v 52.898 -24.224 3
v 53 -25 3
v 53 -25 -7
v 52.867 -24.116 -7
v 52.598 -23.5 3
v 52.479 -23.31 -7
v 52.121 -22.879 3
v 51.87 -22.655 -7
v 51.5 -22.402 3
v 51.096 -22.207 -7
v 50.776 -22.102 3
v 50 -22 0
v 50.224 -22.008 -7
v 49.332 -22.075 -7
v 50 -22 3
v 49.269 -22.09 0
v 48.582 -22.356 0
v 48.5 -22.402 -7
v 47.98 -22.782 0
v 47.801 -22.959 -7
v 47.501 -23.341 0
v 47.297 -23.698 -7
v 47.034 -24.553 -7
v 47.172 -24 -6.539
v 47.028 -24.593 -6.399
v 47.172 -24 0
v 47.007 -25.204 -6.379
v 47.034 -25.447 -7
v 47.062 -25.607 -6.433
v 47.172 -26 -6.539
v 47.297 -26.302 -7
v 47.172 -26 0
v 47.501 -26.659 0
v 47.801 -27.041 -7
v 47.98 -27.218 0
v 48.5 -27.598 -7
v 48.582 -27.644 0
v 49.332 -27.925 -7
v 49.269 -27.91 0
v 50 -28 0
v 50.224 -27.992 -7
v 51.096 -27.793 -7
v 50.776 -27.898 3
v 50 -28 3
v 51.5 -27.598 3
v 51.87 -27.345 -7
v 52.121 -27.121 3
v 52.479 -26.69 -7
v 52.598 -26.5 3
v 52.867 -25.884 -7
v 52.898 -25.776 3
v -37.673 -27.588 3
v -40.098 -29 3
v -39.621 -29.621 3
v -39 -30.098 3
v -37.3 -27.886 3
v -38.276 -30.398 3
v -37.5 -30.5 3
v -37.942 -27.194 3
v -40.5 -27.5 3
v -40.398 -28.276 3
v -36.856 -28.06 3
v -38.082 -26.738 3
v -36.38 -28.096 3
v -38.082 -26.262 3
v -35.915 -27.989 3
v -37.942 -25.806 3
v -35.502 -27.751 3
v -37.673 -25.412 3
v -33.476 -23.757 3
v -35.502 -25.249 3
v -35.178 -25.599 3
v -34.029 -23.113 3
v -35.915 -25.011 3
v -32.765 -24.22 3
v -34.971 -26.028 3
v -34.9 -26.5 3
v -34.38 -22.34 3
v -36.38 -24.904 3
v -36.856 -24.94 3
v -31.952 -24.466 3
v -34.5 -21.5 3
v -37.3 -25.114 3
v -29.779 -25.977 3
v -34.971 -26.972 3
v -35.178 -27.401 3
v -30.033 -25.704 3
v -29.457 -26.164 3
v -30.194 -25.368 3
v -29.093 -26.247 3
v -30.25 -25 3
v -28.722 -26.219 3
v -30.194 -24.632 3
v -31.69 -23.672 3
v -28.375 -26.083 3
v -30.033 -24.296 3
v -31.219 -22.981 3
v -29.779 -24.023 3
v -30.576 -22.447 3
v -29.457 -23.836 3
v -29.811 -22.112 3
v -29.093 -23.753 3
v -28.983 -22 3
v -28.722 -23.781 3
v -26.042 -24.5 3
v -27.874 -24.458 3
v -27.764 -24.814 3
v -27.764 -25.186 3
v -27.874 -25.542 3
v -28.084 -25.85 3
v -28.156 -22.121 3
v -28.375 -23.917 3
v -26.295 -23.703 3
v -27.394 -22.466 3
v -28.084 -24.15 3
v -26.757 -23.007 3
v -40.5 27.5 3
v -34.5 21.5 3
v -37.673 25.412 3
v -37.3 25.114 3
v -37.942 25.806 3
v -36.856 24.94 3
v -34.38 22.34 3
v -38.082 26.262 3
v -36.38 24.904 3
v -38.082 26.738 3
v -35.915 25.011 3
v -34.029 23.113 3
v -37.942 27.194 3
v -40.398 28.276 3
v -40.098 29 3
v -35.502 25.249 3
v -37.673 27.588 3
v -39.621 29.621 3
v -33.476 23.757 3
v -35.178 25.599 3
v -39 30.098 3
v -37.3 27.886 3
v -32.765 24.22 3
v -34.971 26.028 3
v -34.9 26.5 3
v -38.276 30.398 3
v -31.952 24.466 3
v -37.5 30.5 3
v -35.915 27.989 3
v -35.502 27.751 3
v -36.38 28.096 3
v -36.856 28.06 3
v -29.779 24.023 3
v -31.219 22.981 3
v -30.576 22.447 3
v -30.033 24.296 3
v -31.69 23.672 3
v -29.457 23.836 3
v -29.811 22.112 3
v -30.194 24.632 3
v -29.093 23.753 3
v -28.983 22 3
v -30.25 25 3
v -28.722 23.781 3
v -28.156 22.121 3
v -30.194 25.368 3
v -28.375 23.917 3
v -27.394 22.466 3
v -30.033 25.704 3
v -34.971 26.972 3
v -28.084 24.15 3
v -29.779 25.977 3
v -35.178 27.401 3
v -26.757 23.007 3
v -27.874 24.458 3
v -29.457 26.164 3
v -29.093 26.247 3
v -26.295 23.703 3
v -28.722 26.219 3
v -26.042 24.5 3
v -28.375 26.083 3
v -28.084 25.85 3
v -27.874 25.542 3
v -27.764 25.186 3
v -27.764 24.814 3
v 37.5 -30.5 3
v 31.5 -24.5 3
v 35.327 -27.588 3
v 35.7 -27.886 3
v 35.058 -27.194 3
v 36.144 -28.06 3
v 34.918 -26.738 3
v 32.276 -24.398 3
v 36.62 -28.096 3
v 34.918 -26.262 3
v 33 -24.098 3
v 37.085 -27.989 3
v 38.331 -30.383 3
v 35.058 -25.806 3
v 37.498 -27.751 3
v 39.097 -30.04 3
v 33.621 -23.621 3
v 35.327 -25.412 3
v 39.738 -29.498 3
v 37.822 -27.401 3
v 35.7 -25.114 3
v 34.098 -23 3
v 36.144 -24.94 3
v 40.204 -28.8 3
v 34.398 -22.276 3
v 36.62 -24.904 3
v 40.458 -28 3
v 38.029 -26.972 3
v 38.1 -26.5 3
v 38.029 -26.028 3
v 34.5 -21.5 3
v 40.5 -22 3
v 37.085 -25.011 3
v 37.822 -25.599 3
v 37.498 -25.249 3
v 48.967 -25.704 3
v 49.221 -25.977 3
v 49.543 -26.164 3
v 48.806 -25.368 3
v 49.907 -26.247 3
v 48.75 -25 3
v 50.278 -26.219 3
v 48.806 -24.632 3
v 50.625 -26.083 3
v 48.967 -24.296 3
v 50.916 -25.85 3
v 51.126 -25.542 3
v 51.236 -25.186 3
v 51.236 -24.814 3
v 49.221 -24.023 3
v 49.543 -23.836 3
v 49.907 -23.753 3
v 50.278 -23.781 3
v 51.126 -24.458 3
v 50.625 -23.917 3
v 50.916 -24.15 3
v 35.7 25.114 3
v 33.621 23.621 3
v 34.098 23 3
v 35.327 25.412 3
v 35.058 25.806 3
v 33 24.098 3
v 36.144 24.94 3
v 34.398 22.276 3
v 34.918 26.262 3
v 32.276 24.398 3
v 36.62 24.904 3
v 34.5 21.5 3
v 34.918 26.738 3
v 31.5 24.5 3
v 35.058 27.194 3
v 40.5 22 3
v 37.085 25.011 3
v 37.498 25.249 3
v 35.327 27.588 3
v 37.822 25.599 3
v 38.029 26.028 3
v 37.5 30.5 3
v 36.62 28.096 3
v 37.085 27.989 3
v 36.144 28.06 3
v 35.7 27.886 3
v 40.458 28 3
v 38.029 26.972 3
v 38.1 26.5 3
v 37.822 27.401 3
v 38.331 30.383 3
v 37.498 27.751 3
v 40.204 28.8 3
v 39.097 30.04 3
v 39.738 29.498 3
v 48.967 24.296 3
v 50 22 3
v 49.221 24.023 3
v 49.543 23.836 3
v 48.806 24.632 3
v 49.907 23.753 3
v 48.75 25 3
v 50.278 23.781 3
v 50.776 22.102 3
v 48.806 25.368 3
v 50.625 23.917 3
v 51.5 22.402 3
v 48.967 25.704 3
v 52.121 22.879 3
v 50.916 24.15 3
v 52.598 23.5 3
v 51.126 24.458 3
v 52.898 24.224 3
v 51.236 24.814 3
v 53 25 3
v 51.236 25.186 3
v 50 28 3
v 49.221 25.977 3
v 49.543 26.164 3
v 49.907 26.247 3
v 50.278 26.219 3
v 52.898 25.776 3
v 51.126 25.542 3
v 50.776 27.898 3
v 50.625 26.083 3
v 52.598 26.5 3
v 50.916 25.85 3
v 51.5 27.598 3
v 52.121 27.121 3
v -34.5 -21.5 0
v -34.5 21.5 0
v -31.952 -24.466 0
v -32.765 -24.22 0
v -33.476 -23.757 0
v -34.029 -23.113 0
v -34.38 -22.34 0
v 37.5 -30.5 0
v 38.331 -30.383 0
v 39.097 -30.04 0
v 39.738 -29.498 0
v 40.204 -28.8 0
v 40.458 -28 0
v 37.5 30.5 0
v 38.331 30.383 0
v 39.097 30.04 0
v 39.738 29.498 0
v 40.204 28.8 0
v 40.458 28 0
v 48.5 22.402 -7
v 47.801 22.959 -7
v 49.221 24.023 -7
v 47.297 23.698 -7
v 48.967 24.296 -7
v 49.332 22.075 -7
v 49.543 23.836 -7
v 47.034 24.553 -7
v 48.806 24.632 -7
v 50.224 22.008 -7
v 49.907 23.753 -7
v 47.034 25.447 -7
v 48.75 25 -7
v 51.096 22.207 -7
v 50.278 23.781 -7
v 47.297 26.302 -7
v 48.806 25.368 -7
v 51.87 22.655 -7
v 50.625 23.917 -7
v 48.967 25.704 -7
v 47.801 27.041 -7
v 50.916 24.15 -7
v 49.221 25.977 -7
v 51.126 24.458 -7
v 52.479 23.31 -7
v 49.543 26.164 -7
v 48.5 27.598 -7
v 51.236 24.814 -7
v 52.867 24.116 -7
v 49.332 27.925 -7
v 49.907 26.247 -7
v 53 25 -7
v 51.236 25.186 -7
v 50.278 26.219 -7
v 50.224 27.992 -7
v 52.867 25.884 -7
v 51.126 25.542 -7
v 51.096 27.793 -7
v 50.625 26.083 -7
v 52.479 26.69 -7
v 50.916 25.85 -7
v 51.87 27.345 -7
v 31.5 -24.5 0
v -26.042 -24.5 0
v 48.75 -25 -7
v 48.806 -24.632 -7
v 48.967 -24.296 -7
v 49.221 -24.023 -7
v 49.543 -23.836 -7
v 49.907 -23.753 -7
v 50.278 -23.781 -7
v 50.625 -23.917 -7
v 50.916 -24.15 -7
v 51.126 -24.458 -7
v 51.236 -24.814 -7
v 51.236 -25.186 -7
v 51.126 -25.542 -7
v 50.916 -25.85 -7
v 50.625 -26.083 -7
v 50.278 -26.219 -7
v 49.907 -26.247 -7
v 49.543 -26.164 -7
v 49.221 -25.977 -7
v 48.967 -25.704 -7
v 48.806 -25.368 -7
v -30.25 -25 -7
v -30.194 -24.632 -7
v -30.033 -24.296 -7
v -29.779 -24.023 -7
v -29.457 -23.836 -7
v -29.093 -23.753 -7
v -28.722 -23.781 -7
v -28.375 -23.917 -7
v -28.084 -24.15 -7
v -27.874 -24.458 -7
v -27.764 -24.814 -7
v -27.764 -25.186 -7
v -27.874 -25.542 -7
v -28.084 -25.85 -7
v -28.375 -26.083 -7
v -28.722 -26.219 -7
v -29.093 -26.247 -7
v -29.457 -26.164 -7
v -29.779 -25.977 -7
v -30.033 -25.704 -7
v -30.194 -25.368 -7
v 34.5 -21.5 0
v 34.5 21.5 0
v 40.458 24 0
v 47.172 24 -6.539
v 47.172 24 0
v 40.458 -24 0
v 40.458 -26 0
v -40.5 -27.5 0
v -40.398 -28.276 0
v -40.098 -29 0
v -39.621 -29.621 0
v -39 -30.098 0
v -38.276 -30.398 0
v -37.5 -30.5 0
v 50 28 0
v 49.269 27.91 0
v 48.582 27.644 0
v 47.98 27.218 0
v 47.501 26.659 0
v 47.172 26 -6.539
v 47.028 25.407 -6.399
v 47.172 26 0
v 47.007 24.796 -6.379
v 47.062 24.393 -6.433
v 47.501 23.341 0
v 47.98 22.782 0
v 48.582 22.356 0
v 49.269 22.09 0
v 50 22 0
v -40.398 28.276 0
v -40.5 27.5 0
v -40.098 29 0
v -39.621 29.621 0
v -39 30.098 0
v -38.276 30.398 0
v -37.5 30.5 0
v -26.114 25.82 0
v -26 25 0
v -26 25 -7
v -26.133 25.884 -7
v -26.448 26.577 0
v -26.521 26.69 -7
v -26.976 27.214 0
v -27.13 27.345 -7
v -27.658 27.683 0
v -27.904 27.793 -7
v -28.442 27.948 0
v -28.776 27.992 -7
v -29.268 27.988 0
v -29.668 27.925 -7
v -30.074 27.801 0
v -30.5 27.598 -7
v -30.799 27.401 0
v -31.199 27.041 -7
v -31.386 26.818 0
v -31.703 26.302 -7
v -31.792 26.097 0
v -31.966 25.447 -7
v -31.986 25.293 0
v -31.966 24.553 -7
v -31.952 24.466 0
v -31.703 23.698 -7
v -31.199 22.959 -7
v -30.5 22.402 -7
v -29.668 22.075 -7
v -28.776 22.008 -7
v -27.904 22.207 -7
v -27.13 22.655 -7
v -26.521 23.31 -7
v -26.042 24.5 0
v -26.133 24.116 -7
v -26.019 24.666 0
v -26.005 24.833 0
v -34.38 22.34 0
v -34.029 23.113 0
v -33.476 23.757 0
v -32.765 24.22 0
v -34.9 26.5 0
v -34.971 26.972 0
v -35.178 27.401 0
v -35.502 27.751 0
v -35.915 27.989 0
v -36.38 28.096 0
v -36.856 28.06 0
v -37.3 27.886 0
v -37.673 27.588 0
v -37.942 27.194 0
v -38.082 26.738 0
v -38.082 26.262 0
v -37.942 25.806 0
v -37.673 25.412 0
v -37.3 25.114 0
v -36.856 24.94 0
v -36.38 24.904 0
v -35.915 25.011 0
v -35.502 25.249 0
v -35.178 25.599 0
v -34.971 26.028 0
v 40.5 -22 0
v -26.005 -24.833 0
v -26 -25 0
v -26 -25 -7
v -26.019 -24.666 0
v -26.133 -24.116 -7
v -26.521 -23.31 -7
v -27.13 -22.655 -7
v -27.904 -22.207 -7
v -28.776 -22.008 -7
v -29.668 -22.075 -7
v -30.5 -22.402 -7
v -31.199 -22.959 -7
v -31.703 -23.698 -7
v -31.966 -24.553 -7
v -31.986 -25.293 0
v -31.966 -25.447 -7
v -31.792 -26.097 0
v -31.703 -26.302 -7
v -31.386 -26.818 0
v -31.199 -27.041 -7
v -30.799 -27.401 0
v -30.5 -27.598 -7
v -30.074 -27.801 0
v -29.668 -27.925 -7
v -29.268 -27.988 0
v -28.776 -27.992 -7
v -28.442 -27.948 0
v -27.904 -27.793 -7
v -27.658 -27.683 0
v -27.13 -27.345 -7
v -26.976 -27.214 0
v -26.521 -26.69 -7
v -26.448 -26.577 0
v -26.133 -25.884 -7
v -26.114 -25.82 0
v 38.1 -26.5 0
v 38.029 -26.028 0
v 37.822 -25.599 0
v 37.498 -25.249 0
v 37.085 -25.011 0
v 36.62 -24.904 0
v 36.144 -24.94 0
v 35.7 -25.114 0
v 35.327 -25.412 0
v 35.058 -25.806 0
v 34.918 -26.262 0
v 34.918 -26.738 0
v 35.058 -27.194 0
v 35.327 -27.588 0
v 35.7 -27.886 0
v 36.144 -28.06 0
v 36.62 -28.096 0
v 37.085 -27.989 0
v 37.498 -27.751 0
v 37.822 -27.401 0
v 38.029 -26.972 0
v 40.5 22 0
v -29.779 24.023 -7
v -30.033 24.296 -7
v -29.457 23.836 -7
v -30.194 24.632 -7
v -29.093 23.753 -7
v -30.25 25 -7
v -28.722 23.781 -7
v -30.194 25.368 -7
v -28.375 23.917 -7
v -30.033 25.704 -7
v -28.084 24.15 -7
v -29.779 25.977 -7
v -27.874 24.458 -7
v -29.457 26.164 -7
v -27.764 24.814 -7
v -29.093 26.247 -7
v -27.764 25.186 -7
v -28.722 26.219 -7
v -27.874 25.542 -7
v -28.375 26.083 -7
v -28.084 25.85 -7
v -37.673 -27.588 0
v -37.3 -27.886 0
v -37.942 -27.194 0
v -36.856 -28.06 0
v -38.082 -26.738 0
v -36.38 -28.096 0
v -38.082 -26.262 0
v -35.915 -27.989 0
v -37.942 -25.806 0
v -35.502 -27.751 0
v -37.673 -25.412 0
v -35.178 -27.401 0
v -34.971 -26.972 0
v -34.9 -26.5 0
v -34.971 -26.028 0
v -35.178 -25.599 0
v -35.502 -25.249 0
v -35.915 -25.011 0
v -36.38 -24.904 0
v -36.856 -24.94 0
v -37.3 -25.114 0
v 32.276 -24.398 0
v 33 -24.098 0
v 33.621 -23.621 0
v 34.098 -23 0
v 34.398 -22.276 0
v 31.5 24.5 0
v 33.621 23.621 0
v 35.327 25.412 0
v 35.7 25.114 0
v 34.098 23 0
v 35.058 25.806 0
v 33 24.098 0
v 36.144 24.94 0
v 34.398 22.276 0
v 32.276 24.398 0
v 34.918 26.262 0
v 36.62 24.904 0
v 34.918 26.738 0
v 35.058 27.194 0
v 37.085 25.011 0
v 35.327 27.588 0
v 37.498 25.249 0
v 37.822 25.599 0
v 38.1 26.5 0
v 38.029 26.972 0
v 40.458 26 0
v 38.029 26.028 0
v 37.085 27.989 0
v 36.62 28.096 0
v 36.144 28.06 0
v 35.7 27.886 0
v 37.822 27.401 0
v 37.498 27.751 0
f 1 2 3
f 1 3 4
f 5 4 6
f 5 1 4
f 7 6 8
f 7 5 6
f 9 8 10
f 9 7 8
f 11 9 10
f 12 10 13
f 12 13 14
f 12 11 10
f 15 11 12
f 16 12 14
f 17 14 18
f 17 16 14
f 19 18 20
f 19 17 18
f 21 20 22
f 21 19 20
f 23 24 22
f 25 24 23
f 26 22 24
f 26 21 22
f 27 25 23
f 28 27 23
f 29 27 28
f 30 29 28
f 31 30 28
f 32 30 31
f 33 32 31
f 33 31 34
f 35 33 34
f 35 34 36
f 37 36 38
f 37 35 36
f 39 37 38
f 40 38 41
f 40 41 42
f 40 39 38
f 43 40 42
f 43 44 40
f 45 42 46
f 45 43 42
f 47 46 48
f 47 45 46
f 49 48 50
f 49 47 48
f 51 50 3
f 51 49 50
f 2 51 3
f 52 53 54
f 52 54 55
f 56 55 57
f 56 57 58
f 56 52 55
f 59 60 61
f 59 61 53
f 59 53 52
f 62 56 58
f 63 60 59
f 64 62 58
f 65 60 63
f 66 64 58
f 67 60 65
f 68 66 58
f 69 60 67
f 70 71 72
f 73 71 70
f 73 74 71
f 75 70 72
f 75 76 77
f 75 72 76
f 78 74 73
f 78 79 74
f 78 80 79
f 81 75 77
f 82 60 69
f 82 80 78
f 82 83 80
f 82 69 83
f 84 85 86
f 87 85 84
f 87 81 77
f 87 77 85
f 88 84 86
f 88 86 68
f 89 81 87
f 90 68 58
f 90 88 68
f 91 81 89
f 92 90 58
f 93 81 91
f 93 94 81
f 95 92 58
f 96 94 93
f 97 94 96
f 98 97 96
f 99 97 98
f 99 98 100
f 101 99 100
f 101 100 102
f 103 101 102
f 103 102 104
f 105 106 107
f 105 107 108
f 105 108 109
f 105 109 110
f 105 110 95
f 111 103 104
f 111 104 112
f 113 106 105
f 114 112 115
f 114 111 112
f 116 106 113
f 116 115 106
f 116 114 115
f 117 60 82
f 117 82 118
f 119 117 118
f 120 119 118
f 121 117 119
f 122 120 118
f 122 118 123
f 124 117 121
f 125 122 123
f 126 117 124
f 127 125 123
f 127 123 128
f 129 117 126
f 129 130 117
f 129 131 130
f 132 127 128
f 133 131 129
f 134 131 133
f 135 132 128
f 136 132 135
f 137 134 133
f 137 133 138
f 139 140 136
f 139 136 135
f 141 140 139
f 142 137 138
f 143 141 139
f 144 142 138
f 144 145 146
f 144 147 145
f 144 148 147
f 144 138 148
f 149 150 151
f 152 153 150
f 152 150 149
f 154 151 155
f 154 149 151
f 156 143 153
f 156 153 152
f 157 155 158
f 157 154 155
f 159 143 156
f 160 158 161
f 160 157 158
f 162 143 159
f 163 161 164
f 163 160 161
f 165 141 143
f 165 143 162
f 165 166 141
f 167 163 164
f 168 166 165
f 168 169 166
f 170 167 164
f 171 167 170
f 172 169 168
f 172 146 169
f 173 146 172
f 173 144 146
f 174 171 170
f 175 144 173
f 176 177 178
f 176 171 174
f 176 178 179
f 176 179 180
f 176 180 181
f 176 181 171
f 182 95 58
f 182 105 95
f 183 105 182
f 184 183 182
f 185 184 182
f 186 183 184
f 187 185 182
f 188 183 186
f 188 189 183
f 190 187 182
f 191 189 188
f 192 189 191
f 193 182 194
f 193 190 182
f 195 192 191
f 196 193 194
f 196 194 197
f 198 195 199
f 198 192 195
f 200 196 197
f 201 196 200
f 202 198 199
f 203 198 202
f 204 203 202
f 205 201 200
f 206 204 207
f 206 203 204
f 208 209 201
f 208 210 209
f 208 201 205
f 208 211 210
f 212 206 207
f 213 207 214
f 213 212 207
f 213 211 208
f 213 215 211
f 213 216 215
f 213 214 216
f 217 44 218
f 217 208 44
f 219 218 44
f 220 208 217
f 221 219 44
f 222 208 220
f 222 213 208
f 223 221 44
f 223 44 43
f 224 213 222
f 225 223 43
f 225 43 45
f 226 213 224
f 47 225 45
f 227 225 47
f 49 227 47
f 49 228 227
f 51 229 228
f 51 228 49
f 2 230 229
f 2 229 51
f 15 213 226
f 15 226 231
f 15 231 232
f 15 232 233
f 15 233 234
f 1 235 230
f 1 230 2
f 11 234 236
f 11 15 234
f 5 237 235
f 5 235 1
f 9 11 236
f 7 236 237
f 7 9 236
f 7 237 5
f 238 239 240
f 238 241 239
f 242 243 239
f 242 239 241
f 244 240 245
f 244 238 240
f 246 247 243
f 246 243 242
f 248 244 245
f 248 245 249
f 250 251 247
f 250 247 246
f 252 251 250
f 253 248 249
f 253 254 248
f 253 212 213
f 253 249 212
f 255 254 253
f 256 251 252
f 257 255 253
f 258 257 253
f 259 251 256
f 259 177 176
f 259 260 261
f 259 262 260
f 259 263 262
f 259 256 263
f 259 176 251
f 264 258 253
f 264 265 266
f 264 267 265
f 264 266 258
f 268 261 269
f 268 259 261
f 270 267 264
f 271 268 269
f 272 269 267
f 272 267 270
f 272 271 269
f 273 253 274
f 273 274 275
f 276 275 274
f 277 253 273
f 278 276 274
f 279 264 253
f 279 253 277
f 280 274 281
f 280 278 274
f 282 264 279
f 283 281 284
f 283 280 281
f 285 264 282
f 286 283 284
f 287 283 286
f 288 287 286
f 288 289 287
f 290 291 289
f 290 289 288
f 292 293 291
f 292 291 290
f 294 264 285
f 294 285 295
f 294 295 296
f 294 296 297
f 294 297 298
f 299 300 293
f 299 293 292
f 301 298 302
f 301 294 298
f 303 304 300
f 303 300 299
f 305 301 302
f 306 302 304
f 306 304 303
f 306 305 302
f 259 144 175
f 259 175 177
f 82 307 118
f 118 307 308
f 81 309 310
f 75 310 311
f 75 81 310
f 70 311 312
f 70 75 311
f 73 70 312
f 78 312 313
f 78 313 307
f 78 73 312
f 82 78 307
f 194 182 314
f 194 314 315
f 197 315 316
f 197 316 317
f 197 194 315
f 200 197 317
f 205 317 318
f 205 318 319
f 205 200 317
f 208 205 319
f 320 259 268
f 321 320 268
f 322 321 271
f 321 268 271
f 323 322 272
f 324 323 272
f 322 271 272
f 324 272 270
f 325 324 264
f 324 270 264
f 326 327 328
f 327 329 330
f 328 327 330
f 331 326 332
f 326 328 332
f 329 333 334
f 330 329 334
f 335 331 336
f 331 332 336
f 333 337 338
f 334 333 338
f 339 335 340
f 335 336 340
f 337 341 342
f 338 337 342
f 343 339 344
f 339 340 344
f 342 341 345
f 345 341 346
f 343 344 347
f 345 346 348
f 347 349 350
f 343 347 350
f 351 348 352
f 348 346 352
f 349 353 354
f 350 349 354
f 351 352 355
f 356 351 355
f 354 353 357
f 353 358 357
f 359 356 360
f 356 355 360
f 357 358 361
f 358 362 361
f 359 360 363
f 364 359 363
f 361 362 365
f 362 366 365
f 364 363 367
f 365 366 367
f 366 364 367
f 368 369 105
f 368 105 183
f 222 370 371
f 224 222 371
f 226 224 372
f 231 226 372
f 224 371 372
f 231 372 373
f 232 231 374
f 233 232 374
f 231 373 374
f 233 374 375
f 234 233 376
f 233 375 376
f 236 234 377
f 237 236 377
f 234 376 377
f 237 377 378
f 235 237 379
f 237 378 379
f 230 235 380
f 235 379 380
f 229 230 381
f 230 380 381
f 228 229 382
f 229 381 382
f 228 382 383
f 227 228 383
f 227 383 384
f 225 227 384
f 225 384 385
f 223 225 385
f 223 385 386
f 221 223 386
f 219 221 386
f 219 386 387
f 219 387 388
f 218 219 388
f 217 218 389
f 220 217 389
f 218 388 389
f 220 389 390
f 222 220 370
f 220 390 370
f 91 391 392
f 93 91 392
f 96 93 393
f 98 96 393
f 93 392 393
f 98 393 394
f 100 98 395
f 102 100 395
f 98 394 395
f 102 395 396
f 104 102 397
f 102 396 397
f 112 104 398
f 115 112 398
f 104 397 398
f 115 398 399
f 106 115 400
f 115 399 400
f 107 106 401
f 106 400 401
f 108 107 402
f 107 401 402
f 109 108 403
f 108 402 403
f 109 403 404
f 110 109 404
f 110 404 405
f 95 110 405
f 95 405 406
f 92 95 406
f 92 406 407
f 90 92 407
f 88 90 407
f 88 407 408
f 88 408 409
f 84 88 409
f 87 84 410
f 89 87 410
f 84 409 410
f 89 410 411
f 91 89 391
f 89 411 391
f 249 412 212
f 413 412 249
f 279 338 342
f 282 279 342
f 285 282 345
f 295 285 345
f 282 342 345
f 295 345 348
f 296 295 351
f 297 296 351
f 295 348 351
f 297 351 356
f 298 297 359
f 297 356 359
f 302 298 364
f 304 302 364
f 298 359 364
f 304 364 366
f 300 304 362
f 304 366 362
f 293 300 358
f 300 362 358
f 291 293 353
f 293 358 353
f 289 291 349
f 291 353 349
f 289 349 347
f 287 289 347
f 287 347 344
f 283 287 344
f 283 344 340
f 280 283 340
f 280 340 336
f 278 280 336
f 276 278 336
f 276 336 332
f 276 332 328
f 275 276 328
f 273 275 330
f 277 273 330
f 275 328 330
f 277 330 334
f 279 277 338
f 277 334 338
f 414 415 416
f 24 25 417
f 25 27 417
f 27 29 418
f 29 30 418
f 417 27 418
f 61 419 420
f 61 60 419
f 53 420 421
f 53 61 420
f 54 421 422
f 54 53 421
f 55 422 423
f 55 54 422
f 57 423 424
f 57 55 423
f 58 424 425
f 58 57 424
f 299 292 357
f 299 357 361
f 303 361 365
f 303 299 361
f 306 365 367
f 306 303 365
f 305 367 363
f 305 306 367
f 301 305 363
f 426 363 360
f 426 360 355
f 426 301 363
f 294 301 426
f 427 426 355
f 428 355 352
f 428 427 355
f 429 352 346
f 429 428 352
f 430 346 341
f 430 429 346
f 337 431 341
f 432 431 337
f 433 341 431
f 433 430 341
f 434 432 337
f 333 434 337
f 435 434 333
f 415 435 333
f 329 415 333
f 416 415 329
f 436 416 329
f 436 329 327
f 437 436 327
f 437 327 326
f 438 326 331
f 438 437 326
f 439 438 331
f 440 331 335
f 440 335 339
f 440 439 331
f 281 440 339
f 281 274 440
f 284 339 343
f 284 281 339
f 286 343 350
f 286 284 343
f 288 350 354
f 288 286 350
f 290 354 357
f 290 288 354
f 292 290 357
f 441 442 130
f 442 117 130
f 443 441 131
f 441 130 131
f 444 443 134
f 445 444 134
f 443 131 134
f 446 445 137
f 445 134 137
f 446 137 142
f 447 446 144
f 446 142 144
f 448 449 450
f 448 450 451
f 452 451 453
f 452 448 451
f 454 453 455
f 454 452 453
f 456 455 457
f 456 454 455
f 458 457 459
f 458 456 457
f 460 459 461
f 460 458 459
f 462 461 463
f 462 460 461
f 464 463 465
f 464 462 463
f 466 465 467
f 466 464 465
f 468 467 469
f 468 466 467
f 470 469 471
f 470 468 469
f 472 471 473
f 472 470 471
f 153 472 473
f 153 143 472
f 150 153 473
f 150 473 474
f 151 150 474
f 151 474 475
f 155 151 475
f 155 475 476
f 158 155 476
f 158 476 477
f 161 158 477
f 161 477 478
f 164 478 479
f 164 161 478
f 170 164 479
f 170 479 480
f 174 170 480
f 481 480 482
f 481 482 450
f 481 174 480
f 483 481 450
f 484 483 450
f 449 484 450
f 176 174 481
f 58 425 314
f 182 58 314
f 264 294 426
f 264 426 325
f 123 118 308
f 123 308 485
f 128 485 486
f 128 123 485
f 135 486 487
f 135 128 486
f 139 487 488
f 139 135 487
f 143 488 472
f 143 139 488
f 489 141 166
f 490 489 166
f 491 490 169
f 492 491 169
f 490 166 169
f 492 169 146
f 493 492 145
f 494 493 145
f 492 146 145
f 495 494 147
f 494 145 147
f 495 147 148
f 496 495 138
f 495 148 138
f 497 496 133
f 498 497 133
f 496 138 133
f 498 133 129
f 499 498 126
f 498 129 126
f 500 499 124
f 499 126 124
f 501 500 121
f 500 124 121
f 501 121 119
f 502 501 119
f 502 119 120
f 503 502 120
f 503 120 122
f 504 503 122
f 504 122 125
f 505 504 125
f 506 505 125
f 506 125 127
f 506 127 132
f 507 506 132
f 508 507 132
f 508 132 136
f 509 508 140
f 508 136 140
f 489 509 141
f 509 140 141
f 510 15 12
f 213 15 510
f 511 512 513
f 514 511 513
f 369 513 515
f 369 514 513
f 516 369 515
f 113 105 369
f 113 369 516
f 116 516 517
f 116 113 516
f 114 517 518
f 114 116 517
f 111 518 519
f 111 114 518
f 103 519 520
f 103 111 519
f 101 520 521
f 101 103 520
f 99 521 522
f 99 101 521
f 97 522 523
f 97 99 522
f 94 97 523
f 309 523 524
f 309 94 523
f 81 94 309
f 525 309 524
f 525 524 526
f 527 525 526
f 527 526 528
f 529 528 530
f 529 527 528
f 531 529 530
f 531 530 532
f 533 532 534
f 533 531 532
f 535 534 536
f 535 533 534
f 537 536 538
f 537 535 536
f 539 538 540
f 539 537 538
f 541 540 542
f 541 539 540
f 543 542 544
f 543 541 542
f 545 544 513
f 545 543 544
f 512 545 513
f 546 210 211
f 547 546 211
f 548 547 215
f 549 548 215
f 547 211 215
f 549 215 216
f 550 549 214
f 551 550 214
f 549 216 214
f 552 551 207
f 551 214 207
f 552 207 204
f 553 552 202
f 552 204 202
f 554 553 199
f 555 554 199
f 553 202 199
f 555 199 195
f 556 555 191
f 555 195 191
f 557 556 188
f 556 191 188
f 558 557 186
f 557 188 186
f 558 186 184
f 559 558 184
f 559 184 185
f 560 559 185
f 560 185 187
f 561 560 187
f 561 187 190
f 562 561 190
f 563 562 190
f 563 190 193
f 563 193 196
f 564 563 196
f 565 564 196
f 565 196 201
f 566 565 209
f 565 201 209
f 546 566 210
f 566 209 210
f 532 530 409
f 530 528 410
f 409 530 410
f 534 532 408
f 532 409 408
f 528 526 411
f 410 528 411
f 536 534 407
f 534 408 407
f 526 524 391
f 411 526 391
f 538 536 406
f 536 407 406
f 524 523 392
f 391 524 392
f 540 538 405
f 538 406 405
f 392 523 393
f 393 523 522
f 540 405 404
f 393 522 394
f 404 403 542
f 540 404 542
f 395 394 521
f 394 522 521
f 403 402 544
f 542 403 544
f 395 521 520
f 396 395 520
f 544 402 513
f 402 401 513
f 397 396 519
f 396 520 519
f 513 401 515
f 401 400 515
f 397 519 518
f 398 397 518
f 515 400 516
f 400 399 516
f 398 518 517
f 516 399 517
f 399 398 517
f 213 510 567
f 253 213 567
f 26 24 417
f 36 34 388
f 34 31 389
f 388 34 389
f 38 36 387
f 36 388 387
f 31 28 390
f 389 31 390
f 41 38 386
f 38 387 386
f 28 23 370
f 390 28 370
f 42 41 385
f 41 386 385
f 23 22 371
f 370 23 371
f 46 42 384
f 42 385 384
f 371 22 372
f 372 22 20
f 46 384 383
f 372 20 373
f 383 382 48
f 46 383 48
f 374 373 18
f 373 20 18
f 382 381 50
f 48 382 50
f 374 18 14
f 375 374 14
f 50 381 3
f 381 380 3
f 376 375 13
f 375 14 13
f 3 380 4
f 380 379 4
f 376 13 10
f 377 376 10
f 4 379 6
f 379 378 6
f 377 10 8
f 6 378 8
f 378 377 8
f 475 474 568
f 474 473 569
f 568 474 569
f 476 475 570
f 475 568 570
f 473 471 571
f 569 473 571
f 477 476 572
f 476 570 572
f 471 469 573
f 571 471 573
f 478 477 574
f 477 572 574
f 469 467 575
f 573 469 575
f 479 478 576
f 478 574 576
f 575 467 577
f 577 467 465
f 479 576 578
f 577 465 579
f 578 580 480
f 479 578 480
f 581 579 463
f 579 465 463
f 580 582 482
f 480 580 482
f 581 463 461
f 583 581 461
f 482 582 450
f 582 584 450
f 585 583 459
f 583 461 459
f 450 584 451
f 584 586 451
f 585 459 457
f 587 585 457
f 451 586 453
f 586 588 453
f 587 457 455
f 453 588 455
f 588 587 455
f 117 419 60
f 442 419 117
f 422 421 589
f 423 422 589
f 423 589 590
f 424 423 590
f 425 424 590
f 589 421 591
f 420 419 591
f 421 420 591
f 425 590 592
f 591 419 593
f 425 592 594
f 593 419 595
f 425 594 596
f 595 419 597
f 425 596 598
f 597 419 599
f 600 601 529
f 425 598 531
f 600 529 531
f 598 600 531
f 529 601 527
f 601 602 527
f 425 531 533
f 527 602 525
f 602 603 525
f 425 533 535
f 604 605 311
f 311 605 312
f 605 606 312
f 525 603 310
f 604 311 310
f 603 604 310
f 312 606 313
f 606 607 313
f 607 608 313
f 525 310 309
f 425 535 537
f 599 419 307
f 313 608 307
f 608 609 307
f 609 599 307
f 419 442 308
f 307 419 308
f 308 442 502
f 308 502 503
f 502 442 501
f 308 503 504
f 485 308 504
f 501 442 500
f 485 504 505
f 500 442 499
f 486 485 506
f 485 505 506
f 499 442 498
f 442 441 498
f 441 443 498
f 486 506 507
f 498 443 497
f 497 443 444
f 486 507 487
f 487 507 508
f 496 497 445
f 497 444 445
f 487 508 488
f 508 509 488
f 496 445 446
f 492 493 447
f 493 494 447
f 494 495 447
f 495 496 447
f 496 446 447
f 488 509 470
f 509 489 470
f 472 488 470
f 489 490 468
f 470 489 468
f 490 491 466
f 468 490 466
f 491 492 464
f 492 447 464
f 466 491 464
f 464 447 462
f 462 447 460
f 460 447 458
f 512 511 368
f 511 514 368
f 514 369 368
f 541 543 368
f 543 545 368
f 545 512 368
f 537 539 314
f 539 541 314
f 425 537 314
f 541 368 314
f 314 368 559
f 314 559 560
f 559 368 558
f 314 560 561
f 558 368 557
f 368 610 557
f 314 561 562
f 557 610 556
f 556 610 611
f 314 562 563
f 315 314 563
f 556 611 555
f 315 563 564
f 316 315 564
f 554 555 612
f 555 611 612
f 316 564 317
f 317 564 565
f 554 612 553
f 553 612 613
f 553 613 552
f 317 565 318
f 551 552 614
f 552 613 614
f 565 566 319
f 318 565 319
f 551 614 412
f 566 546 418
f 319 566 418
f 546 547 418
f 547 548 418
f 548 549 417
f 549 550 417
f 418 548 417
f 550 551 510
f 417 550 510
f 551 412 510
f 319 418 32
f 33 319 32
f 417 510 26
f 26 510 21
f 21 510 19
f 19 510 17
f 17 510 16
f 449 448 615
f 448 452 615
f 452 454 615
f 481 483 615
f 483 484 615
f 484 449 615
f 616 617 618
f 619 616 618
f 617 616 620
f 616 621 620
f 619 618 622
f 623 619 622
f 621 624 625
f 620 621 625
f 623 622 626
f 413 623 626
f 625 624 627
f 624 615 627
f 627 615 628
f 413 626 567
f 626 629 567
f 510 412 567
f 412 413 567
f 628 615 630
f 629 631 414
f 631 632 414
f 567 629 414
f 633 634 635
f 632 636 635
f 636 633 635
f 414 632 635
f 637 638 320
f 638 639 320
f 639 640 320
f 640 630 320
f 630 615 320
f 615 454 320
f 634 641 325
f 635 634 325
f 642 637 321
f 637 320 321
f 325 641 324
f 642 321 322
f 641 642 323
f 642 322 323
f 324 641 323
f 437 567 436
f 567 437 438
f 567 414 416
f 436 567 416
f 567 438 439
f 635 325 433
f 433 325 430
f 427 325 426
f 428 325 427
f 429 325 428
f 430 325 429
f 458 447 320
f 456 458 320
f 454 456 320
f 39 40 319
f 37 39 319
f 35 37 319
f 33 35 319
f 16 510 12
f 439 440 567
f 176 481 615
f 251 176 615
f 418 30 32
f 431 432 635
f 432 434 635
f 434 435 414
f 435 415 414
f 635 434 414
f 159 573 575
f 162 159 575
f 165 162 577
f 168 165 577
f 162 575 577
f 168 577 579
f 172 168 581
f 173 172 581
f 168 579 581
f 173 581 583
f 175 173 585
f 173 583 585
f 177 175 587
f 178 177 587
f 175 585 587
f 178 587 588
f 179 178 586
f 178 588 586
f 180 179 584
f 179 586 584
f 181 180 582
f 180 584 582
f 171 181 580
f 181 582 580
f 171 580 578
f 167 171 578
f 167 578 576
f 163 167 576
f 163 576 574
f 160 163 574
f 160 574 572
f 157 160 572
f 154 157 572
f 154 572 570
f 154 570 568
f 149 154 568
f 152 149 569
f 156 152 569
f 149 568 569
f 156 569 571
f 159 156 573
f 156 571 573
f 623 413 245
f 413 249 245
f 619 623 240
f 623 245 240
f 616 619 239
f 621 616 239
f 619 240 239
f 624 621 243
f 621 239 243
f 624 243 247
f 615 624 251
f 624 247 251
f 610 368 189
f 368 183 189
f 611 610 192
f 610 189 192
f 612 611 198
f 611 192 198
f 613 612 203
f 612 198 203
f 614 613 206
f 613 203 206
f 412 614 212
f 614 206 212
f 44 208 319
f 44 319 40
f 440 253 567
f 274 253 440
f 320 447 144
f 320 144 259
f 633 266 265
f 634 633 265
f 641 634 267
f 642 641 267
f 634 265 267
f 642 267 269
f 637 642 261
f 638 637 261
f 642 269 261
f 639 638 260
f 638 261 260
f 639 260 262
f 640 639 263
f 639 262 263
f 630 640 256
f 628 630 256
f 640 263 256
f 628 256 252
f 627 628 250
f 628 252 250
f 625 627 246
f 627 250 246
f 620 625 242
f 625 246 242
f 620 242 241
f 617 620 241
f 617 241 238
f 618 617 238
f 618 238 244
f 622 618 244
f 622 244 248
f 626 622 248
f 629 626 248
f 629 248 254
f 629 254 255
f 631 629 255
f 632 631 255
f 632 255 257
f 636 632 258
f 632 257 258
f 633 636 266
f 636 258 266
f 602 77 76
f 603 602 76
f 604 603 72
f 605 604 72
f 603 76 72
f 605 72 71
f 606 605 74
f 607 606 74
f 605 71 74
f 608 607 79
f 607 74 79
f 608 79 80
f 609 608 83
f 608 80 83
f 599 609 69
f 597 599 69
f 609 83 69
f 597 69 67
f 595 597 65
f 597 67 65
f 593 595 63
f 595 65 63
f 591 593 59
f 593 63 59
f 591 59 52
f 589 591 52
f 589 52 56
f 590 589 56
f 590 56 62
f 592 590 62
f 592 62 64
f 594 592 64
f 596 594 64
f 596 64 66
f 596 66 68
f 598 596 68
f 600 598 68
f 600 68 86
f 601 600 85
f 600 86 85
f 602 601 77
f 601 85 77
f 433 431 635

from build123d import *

# Parameters (mm, degrees)
SKETCH1_W           = 81
SKETCH1_H           = 61
SKETCH1_W_2         = 69
SKETCH1_H_2         = 49
EXTRUDE_THIN1_DEPTH = 3
SKETCH2_R           = 1.6
CUT_EXTRUDE1_DEPTH  = 3
FILLET1_R           = 3
SKETCH4_R           = 3
BOSS_EXTRUDE1_DEPTH = 10
BOSS_EXTRUDE2_DEPTH = 3
SKETCH5_R           = 1.25
CUT_EXTRUDE2_DEPTH  = 10
RIB2_REACH          = 79.06
SKETCH7_WALL_W      = 166.153683654
SKETCH7_WALL_H      = 2
LPATTERN1_COUNT     = 2
LPATTERN1_PITCH     = 50


with BuildPart() as part:
    # Sketch1 → Extrude-Thin1 (new body)
    with BuildSketch(Plane.XY):
        Rectangle(SKETCH1_W, SKETCH1_H)
        Rectangle(SKETCH1_W_2, SKETCH1_H_2, mode=Mode.SUBTRACT)
    extrude(amount=EXTRUDE_THIN1_DEPTH)

    # Sketch2 → Cut-Extrude1 (cut)
    with BuildSketch(Plane.XY.offset(3)):
        with Locations((-36.5, 26.5)):
            Circle(SKETCH2_R)
        with Locations((36.5, 26.5)):
            Circle(SKETCH2_R)
        with Locations((36.5, -26.5)):
            Circle(SKETCH2_R)
        with Locations((-36.5, -26.5)):
            Circle(SKETCH2_R)
    extrude(amount=-CUT_EXTRUDE1_DEPTH, mode=Mode.SUBTRACT)

    # Fillet1
    fillet1_edges = [part.edges().sort_by_distance(p)[0] for p in [
        (-34.5, 24.5, 1.5),
        (-34.5, -24.5, 1.5),
        (34.5, -24.5, 1.5),
        (34.5, 24.5, 1.5),
        (-40.5, 30.5, 1.5),
        (40.5, 30.5, 1.5),
        (40.5, -30.5, 1.5),
        (-40.5, -30.5, 1.5),
    ]]
    fillet(fillet1_edges, radius=FILLET1_R)

    # Sketch4 → Boss-Extrude1 (add)
    with BuildSketch(Plane.XY.offset(3)):
        with Locations((-29, 25)):
            Circle(SKETCH4_R)
        with Locations((50, 25)):
            Circle(SKETCH4_R)
        with Locations((50, -25)):
            Circle(SKETCH4_R)
        with Locations((-29, -25)):
            Circle(SKETCH4_R)
    extrude(amount=-BOSS_EXTRUDE1_DEPTH)


with BuildPart() as boss_extrude1_piece_1:
    # of the separate pieces the step leaves, piece 1, a body of its own (boss_extrude1_pieces)
    add(part.part.solids().sort_by_distance((-37.5, -30.5, 0))[0])



with BuildPart() as boss_extrude1_piece_2:
    # of the separate pieces the step leaves, piece 2, a body of its own (boss_extrude1_pieces)
    add(part.part.solids().sort_by_distance((53, 25, 3))[0])


with BuildPart() as boss_extrude1_piece_3:
    # of the separate pieces the step leaves, piece 3, a body of its own (boss_extrude1_pieces)
    add(part.part.solids().sort_by_distance((53, -25, 3))[0])


with BuildPart() as boss_extrude1_piece_1_1:
    add(boss_extrude1_piece_1.part)

    add(boss_extrude1_piece_2.part)  # Boss-Extrude2 merges Boss-Extrude1 piece 2

    add(boss_extrude1_piece_3.part)  # Boss-Extrude2 merges Boss-Extrude1 piece 3
    # Sketch6 → Boss-Extrude2 (add)
    with BuildSketch(Plane.XY.offset(3)):
        with BuildLine():
            Line((50, 28), (40.458039892, 28))
            Line((40.458039892, 28), (40.5, 22))
            Line((40.5, 22), (50, 22))
            ThreePointArc((50, 22), (53, 25), (50, 28))
        make_face()
        with BuildLine():
            Line((40.5, -22), (40.458039892, -28))
            Line((40.458039892, -28), (50, -28))
            ThreePointArc((50, -28), (53, -25), (50, -22))
            Line((50, -22), (40.5, -22))
        make_face()
    extrude(amount=-BOSS_EXTRUDE2_DEPTH)

    # Sketch5 → Cut-Extrude2 (cut)
    with BuildSketch(Plane(origin=(0, 0, -7), x_dir=(-1, 0, 0), z_dir=(0, 0, -1))):
        with Locations((-50, 25)):
            Circle(SKETCH5_R)
        with Locations((29, 25)):
            Circle(SKETCH5_R)
        with Locations((-50, -25)):
            Circle(SKETCH5_R)
        with Locations((29, -25)):
            Circle(SKETCH5_R)
    extrude(amount=-CUT_EXTRUDE2_DEPTH, mode=Mode.SUBTRACT)

    # Sketch7 wall → Rib2 (add, up to next)
    with BuildSketch(Plane(origin=(44.051757722, 25, -3.500496738), x_dir=(-0.716336631923, 0, 0.697754849331), z_dir=(0.697754849331, 0, 0.716336631923)), mode=Mode.PRIVATE) as rib2_sk1:
        Rectangle(SKETCH7_WALL_W, SKETCH7_WALL_H)
    rib2_tool1 = extrude(rib2_sk1.sketch, amount=RIB2_REACH, mode=Mode.PRIVATE) - boss_extrude1_piece_1_1.part
    rib2 = rib2_tool1.solids().sort_by_distance((44.051757722, 25, -3.500496738))[0]
    add(rib2)

    # LPattern1: Rib2 ×2
    with Locations(*[(0, -i * LPATTERN1_PITCH, 0) for i in range(1, LPATTERN1_COUNT)]):
        add(rib2)


solid = boss_extrude1_piece_1_1.part
